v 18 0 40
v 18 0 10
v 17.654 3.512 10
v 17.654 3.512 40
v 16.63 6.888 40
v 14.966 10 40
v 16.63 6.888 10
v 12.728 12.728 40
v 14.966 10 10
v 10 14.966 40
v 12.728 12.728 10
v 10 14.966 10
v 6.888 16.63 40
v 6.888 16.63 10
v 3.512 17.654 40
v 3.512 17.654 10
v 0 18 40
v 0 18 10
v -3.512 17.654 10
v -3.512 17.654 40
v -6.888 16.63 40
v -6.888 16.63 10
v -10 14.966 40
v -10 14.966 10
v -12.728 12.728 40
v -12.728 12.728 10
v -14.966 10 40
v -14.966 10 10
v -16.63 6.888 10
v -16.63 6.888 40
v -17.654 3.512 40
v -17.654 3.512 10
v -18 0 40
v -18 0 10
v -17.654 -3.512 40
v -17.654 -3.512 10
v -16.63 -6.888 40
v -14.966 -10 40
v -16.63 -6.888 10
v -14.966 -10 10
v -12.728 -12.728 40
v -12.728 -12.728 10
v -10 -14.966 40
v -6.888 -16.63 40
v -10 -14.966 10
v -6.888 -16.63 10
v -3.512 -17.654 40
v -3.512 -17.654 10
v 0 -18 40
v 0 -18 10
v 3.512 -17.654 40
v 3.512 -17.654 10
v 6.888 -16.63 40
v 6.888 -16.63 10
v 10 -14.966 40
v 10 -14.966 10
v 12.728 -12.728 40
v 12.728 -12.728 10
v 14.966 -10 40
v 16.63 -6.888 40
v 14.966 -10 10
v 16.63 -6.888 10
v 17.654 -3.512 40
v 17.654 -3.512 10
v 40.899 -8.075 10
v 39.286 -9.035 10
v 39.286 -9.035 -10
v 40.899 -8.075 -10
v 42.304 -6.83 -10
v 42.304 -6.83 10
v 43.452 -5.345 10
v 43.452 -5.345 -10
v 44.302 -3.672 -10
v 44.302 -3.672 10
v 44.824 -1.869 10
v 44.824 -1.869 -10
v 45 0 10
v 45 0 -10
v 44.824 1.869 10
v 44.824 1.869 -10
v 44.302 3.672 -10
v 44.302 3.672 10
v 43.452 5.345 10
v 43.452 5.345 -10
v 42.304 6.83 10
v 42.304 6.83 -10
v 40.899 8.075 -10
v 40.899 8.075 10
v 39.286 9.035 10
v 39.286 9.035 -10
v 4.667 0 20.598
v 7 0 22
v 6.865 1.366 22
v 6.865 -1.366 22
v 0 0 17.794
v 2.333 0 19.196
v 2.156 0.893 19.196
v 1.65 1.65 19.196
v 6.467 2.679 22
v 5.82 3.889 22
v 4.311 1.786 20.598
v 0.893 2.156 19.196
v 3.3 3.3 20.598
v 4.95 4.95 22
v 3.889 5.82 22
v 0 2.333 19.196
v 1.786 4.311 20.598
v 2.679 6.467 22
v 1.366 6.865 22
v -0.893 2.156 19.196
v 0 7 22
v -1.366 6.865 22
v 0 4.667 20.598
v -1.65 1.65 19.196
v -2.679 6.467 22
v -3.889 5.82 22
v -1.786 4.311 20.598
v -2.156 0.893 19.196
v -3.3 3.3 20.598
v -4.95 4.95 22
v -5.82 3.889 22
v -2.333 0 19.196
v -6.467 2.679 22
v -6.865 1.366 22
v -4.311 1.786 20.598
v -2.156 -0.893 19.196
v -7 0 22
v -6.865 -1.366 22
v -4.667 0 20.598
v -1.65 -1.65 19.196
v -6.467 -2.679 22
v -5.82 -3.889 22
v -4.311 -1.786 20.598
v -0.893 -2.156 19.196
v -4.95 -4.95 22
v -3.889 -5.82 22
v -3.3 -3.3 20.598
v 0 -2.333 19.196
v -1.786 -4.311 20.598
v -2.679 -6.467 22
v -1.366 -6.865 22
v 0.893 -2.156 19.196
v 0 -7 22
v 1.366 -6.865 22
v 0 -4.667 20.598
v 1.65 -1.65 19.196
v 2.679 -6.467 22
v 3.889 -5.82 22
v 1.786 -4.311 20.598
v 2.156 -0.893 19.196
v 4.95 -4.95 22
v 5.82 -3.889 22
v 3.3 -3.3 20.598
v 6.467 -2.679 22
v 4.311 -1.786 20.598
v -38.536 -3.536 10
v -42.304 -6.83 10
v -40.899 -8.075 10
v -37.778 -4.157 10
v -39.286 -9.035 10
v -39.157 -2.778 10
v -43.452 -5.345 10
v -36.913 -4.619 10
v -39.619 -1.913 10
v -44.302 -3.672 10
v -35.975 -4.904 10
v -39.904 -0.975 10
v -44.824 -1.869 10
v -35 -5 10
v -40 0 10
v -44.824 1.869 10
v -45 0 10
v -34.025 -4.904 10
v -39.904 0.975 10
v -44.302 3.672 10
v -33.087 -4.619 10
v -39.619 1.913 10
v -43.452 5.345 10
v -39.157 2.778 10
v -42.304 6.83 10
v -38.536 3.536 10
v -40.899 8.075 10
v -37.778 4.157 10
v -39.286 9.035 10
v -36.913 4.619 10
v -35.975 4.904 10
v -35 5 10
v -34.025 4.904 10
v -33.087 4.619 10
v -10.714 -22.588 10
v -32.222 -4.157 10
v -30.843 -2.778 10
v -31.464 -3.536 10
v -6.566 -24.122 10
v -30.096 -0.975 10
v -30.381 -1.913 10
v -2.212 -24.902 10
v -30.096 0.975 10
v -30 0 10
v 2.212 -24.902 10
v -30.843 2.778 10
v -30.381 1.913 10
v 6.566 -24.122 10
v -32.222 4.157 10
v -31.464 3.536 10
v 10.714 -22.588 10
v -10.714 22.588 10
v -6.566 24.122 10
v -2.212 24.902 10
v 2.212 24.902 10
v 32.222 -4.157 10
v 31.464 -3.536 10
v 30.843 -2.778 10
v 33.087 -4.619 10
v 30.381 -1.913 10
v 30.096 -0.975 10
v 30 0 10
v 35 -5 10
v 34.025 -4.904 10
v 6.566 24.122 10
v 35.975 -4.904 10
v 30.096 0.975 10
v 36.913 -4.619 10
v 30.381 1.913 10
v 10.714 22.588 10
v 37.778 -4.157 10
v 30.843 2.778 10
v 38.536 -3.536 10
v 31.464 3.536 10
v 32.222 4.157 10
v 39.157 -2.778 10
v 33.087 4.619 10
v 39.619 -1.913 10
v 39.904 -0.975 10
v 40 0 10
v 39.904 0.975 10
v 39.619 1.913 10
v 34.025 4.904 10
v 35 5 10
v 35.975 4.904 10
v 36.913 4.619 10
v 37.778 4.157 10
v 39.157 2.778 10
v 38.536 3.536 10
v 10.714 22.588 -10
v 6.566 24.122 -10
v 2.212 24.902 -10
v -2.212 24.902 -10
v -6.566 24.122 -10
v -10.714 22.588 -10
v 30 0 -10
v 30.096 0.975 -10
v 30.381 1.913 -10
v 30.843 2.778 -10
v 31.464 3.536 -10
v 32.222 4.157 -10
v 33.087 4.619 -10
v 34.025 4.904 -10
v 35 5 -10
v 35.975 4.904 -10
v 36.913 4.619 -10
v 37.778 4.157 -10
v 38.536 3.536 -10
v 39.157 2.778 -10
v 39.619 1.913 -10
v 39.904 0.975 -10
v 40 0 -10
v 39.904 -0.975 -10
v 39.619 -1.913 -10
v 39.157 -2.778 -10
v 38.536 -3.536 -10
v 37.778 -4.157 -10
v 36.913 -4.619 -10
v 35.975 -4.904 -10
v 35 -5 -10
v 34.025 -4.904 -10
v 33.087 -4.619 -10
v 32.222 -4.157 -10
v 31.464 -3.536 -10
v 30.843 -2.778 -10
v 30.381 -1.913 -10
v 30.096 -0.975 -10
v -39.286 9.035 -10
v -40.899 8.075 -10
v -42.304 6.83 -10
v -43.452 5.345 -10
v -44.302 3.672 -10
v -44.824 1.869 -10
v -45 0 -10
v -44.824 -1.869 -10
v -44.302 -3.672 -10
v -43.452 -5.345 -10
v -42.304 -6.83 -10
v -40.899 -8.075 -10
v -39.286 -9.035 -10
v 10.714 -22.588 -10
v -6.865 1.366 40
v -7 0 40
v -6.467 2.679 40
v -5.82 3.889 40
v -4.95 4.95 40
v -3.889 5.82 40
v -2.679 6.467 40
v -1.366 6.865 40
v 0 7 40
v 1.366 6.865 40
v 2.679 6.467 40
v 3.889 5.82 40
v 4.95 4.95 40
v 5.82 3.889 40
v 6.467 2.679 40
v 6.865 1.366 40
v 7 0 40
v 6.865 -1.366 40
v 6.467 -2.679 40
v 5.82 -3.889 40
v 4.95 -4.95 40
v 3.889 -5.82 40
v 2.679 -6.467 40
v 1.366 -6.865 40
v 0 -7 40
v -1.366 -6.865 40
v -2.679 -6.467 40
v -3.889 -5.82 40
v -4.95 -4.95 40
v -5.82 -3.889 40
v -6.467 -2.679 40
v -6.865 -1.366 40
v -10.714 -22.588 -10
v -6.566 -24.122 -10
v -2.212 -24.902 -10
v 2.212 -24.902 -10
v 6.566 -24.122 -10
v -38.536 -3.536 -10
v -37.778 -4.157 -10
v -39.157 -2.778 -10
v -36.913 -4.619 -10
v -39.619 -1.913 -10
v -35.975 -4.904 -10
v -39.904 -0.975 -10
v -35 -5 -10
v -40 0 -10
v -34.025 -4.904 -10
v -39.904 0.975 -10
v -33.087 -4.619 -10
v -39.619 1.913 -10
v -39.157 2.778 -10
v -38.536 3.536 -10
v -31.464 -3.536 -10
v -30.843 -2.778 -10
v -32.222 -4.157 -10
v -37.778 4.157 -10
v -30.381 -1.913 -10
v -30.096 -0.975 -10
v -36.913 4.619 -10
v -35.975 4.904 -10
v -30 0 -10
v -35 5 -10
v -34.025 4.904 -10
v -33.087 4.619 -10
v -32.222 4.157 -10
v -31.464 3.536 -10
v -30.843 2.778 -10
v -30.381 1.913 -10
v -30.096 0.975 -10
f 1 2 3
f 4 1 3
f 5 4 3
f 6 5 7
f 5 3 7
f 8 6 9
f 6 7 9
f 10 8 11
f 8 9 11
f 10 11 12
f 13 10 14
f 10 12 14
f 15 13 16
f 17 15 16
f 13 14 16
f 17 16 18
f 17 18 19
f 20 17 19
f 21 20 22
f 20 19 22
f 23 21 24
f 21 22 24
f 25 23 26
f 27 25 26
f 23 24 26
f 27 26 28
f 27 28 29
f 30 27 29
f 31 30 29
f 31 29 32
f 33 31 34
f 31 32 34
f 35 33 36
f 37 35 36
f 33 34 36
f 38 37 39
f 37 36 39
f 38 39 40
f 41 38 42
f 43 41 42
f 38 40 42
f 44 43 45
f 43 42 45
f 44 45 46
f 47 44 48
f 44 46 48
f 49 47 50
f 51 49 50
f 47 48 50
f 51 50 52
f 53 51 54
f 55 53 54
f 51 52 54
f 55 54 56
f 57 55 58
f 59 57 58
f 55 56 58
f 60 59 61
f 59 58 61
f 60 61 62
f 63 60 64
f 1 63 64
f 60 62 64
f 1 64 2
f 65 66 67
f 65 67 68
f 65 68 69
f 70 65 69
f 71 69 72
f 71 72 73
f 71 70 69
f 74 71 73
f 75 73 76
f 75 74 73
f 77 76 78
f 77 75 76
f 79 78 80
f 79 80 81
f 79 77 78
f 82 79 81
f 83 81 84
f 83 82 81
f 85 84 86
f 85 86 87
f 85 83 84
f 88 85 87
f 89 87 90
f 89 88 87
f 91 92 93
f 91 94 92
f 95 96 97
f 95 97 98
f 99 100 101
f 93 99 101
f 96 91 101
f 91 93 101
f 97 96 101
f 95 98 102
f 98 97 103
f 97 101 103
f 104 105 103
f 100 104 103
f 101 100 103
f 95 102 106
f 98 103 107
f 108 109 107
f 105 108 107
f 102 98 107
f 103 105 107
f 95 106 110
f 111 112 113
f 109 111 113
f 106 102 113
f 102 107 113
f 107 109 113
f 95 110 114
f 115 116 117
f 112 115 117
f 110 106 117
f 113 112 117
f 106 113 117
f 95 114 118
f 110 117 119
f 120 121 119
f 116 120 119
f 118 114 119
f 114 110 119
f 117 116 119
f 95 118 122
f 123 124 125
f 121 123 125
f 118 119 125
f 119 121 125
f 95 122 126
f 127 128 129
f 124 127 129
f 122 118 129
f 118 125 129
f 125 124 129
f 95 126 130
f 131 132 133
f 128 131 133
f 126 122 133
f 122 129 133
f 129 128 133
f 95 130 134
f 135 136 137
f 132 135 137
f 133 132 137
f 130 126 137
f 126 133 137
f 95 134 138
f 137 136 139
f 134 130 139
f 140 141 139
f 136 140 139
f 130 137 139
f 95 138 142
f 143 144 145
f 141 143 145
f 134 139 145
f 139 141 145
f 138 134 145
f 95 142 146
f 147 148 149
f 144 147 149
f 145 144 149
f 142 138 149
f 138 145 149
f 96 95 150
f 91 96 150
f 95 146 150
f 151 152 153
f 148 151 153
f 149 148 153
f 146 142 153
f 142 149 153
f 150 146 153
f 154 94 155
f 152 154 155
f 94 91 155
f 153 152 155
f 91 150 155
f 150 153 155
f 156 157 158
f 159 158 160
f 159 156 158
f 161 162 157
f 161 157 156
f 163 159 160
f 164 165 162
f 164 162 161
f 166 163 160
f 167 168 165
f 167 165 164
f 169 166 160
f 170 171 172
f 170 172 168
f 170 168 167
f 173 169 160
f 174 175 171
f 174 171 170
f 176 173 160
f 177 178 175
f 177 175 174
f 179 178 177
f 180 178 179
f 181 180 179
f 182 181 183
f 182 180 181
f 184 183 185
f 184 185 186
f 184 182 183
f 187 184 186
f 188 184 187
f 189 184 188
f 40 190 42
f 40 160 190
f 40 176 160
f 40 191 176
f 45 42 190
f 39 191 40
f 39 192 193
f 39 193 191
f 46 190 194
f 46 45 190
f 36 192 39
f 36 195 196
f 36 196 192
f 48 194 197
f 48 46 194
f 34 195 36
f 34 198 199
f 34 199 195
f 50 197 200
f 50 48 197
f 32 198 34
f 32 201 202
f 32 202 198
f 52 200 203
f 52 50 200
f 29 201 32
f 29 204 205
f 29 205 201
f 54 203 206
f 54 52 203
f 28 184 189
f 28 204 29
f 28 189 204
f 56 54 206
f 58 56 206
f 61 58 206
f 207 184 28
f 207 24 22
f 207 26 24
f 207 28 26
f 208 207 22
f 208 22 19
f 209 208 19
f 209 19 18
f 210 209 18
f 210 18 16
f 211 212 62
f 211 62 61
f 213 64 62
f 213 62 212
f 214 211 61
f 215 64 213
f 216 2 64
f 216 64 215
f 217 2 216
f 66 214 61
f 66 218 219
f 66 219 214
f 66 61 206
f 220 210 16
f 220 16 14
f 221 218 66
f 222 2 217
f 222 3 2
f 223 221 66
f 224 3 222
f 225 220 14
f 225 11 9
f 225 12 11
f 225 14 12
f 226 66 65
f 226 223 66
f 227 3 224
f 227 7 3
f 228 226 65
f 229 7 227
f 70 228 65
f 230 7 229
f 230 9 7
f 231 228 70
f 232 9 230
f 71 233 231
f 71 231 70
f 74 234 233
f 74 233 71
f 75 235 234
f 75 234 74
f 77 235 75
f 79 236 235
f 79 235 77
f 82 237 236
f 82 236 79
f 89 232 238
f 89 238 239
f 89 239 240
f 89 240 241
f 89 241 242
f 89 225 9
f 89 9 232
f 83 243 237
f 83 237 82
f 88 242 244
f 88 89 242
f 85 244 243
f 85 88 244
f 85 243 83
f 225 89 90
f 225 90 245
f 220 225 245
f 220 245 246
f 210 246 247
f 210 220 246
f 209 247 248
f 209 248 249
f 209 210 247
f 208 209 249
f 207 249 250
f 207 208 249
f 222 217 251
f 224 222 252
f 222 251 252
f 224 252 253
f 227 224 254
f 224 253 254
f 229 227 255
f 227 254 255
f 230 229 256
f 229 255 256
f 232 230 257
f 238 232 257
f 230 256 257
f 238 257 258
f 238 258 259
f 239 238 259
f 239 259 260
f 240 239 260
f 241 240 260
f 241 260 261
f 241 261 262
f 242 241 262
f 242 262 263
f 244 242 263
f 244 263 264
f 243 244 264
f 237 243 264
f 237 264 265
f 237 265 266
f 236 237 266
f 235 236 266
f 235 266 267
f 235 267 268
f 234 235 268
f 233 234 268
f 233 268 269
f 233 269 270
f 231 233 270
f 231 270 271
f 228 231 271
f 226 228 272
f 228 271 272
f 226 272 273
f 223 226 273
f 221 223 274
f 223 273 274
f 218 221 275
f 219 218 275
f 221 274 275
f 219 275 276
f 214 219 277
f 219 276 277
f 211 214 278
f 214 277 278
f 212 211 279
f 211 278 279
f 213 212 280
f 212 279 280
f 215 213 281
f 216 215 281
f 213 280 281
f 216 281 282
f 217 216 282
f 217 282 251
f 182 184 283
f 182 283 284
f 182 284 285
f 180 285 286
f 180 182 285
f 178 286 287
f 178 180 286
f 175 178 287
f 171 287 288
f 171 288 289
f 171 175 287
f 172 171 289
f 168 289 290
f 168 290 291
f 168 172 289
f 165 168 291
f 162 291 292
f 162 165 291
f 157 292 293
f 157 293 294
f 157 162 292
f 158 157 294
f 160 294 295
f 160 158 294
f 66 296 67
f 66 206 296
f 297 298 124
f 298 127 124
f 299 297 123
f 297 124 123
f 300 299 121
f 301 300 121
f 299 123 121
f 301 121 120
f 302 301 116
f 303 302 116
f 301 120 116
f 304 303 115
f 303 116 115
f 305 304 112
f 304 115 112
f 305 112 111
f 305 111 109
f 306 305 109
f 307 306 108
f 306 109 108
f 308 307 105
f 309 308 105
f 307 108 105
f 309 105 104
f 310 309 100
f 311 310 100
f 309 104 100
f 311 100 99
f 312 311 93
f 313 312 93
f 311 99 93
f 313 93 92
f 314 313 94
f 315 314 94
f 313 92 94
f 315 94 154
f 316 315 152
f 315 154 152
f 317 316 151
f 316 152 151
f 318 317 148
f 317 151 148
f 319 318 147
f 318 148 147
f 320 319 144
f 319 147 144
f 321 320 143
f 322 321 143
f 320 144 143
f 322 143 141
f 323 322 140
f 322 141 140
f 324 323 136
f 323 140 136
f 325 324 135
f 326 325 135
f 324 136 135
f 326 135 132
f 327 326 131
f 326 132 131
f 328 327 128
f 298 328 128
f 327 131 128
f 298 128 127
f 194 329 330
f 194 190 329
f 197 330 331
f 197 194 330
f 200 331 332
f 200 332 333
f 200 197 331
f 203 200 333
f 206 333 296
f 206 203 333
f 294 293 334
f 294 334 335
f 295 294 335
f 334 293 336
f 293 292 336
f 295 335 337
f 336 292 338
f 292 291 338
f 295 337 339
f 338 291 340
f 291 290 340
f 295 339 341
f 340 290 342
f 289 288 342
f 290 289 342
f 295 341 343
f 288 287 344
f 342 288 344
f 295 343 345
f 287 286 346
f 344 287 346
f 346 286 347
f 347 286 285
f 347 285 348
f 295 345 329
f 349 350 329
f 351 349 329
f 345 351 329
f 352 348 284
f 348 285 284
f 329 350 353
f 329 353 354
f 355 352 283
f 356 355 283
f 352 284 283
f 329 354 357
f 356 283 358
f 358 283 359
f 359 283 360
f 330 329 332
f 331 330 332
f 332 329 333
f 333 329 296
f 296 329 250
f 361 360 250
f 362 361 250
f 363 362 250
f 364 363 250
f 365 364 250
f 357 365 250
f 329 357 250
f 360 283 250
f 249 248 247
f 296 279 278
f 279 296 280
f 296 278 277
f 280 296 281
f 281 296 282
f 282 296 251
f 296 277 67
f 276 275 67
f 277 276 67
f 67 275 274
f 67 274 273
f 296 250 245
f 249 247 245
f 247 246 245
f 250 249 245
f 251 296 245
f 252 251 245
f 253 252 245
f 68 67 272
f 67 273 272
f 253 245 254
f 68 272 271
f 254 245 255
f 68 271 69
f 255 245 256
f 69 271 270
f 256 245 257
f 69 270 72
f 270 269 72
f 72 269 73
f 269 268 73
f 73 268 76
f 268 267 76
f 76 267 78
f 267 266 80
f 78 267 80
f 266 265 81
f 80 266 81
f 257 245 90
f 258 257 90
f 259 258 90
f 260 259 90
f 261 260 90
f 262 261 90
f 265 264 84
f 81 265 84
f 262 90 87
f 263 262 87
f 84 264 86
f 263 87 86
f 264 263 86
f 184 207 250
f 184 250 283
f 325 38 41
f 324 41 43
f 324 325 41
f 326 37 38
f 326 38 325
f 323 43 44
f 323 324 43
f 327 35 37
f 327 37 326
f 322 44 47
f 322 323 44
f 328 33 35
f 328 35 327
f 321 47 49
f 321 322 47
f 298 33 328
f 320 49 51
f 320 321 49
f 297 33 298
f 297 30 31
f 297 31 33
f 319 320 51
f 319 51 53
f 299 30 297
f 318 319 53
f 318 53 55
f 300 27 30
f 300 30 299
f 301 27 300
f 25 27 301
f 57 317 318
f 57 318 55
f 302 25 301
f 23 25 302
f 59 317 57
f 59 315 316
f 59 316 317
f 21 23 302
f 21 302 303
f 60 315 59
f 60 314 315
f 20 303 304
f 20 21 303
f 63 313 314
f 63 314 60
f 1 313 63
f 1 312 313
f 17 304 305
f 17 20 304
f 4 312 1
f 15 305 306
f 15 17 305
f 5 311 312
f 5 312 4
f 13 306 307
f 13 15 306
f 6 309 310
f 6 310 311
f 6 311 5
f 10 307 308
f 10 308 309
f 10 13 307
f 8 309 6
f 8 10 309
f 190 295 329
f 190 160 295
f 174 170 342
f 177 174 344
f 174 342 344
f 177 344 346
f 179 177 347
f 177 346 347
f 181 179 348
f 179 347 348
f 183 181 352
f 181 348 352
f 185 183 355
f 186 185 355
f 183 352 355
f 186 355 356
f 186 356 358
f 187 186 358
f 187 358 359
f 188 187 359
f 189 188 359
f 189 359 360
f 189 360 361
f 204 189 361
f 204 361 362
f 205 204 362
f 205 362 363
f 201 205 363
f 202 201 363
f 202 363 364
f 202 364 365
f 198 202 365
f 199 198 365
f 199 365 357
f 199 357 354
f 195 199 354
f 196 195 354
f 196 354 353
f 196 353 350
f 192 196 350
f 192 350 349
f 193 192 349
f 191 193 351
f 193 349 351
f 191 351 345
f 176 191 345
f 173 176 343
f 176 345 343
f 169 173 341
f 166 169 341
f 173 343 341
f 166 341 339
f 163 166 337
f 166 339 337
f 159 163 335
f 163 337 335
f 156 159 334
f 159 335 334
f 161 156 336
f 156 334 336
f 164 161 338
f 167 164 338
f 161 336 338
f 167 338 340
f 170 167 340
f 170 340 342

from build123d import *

# Parameters (mm, degrees)
F1_DEPTH = 10
F3_D     = 10
F4_R     = 18
F5_DEPTH = 30
F7_D     = 14
F7_DEPTH = 18
F7_TIP   = 4.2060243332


with BuildPart() as f1:
    # F0 (on Top) → F1 (new body, symmetric)
    with BuildSketch(Plane.XY):
        with BuildLine():
            ThreePointArc((10.7142857143, 22.5876975726), (21.1288563682, 13.3630620956), (25, 0))
            ThreePointArc((25, 0), (29.6547751618, 8.4515425473), (39.2857142857, 9.0350790291))
            Line((39.2857142857, 9.0350790291), (10.7142857143, 22.5876975726))
        make_face()
        with BuildLine():
            ThreePointArc((39.2857142857, -9.0350790291), (29.6547751618, -8.4515425473), (25, 0))
            ThreePointArc((25, 0), (21.1288563682, -13.3630620956), (10.7142857143, -22.5876975726))
            Line((10.7142857143, -22.5876975726), (39.2857142857, -9.0350790291))
        make_face()
        with BuildLine():
            ThreePointArc((-25, 0), (-21.1288563682, 13.3630620956), (-10.7142857143, 22.5876975726))
            Line((-10.7142857143, 22.5876975726), (-39.2857142857, 9.0350790291))
            ThreePointArc((-39.2857142857, 9.0350790291), (-29.6547751618, 8.4515425473), (-25, 0))
        make_face()
        with BuildLine():
            ThreePointArc((-39.2857142857, -9.0350790291), (-29.6547751618, -8.4515425473), (-25, 0))
            ThreePointArc((-25, 0), (-29.6547751618, 8.4515425473), (-39.2857142857, 9.0350790291))
            ThreePointArc((-39.2857142857, 9.0350790291), (-45, 0), (-39.2857142857, -9.0350790291))
        make_face()
        with BuildLine():
            ThreePointArc((39.2857142857, 9.0350790291), (29.6547751618, 8.4515425473), (25, 0))
            ThreePointArc((25, 0), (29.6547751618, -8.4515425473), (39.2857142857, -9.0350790291))
            ThreePointArc((39.2857142857, -9.0350790291), (43.4515425473, -5.3452248382), (45, 0))
            ThreePointArc((45, 0), (43.4515425473, 5.3452248382), (39.2857142857, 9.0350790291))
        make_face()
        with BuildLine():
            Line((-39.2857142857, -9.0350790291), (-10.7142857143, -22.5876975726))
            ThreePointArc((-10.7142857143, -22.5876975726), (-21.1288563682, -13.3630620956), (-25, 0))
            ThreePointArc((-25, 0), (-29.6547751618, -8.4515425473), (-39.2857142857, -9.0350790291))
        make_face()
        with BuildLine():
            ThreePointArc((10.7142857143, -22.5876975726), (21.1288563682, -13.3630620956), (25, 0))
            ThreePointArc((25, 0), (21.1288563682, 13.3630620956), (10.7142857143, 22.5876975726))
            ThreePointArc((10.7142857143, 22.5876975726), (0, 25), (-10.7142857143, 22.5876975726))
            ThreePointArc((-10.7142857143, 22.5876975726), (-21.1288563682, 13.3630620956), (-25, 0))
            ThreePointArc((-25, 0), (-21.1288563682, -13.3630620956), (-10.7142857143, -22.5876975726))
            ThreePointArc((-10.7142857143, -22.5876975726), (0, -25), (10.7142857143, -22.5876975726))
        make_face()
    extrude(amount=F1_DEPTH, both=True)

    # F3 (through all)
    with Locations(Plane.XY.offset(10)):
        with Locations((-35, 0), (35, 0)):
            Hole(F3_D / 2)

    # F4 (on face) → F5 (join)
    with BuildSketch(Plane.XY.offset(10)):
        Circle(F4_R)
    extrude(amount=F5_DEPTH)

    # F7
    with Locations(Plane.XY.offset(40)):
        with Locations((0, 0)):
            Hole(F7_D / 2, depth=F7_DEPTH)
            with Locations((0, 0, -(F7_DEPTH + F7_TIP / 2))):  # 118° drill point
                Cone(0, F7_D / 2, F7_TIP, mode=Mode.SUBTRACT)


solid = f1.part
